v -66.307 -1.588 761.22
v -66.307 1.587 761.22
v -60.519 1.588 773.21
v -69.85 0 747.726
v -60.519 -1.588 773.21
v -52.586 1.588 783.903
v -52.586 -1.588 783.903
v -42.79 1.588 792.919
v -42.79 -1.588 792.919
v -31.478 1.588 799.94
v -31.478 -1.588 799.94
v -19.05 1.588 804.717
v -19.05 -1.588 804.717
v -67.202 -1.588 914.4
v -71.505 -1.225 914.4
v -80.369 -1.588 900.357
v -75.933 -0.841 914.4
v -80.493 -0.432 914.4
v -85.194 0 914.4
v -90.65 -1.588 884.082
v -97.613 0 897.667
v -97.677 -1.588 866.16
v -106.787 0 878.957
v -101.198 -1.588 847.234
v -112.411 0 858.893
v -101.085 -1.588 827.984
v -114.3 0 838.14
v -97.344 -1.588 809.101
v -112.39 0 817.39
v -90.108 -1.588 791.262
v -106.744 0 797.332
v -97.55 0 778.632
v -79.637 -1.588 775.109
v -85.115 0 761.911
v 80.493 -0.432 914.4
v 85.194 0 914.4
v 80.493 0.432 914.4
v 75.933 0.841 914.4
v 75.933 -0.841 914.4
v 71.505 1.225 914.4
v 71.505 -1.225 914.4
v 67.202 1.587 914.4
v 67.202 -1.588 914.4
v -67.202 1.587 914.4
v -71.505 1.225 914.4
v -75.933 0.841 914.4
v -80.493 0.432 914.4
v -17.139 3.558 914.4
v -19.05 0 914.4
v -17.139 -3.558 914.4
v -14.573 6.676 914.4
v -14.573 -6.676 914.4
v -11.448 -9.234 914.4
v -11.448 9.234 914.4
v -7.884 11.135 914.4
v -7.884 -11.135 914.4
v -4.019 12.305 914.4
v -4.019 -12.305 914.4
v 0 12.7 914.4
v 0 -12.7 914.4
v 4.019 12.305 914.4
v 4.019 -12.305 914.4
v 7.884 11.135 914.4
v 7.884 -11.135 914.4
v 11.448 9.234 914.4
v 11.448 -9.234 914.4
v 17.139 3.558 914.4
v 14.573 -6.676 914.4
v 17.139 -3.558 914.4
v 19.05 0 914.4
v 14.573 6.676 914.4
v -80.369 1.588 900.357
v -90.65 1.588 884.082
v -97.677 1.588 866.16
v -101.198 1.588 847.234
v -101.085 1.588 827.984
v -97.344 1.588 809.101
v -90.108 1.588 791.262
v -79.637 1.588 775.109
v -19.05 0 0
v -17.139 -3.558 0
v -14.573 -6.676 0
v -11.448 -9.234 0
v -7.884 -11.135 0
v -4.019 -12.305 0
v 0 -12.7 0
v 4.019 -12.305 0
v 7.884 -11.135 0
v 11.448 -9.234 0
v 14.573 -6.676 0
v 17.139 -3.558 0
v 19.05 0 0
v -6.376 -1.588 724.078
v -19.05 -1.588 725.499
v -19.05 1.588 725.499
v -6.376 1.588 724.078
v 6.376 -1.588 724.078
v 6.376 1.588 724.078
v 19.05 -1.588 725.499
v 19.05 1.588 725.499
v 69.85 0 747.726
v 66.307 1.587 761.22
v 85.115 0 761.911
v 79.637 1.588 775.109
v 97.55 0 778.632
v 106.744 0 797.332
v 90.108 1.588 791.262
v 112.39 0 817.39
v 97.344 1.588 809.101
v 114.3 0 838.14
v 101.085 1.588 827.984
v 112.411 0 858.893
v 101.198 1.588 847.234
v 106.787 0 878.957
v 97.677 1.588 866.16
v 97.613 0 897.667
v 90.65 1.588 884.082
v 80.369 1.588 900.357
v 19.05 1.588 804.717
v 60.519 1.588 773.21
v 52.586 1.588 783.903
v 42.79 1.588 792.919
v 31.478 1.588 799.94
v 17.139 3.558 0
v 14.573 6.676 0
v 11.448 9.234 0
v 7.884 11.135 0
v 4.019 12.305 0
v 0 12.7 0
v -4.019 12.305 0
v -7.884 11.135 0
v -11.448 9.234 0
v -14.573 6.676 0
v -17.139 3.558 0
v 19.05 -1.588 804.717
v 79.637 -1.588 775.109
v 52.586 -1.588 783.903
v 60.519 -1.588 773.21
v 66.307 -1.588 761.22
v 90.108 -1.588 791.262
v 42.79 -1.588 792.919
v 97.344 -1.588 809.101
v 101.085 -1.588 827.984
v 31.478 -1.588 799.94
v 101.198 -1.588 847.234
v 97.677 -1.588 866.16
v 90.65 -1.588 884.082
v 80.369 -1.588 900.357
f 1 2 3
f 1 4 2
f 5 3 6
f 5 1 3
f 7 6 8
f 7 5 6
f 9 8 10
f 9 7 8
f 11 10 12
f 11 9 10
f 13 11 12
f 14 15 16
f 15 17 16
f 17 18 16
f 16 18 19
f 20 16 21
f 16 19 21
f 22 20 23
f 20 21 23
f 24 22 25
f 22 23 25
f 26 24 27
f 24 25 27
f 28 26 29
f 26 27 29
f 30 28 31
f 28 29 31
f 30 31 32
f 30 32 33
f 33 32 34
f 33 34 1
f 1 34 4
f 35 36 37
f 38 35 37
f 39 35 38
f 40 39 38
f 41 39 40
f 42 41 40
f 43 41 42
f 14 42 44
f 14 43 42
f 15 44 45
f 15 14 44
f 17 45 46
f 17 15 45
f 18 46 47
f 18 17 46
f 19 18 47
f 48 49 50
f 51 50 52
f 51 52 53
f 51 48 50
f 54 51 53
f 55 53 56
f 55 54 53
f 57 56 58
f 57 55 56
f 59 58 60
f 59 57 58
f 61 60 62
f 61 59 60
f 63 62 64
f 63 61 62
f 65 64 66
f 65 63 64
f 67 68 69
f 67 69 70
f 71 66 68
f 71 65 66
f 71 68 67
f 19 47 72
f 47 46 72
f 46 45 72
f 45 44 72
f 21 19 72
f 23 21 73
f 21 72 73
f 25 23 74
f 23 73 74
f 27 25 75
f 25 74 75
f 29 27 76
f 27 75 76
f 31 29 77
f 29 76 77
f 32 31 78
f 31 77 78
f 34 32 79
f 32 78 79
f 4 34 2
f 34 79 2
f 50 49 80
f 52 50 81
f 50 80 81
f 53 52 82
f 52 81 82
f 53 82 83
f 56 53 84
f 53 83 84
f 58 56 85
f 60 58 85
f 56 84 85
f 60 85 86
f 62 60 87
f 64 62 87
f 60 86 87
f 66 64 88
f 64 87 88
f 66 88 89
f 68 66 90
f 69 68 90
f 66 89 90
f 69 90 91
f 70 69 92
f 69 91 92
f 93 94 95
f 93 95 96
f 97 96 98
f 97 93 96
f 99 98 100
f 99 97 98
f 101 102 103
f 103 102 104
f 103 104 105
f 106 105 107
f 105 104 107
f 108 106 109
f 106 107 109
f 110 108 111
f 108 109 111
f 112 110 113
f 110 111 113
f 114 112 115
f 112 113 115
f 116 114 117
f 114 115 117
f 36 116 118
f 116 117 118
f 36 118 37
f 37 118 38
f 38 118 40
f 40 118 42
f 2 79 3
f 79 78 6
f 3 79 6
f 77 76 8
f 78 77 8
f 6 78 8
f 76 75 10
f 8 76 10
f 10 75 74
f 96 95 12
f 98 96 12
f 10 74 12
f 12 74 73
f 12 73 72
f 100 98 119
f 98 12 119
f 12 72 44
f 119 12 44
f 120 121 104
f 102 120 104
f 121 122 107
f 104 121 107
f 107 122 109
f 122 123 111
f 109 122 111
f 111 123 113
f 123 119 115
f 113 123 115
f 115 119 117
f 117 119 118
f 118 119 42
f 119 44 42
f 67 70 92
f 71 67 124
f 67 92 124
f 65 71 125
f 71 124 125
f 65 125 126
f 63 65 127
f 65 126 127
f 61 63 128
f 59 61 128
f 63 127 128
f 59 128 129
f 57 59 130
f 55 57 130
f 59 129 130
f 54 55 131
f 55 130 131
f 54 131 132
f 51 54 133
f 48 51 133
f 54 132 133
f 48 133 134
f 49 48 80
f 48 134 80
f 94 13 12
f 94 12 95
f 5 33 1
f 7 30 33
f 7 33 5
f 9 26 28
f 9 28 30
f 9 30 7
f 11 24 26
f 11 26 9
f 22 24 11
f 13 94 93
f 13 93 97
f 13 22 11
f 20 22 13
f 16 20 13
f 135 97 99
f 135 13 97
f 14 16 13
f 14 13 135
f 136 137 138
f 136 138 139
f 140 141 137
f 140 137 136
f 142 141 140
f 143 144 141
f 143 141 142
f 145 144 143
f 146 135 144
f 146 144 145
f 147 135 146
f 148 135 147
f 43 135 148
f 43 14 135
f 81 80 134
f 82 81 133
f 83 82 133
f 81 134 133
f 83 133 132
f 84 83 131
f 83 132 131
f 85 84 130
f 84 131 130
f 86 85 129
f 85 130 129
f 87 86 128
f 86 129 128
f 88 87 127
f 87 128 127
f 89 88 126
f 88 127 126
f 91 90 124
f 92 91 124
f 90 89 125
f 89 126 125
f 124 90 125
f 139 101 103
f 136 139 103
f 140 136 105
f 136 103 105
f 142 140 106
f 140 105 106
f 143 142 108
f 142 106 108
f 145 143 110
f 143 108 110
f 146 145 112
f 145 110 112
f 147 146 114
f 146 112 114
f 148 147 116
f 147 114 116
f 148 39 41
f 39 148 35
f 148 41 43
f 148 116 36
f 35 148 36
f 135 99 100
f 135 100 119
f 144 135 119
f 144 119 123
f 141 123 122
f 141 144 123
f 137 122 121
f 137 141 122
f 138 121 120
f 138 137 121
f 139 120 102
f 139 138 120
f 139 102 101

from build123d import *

# Parameters (mm, degrees)
F1_DEPTH      = 914.4
F3_DEPTH      = 1.5875
F3_DEPTH_BACK = 1.5875
F4_SIZE2      = 1.5875
F4_SIZE       = 12.7
F5_SIZE2      = 12.69999
F5_SIZE       = 1.58749
F5_2_SIZE2    = 12.69999
F5_2_SIZE     = 1.58749


# Not quite as in the source:
# - a fillet or chamfer is up to 0.001 mm smaller than in the source, because OpenCascade refuses the exact size


with BuildPart() as f1:
    # F0 (on Top) → F1 (new body)
    with BuildSketch(Plane.XY):
        with BuildLine():
            ThreePointArc((-19.05, 0), (0, -12.7), (19.05, 0))
            ThreePointArc((19.05, 0), (0, 12.7), (-19.05, 0))
        make_face()
    extrude(amount=F1_DEPTH)


with BuildPart() as f3:
    # F2 (on Front) → F3 (new body, two sides)
    with BuildSketch(Plane.XZ) as f3_sk:
        with BuildLine():
            Line((85.1941899427, 914.4), (-85.1941899427, 914.4))
            ThreePointArc((-85.1941899427, 914.4), (-113.8186945704, 827.7217002194), (-69.85, 747.7264265103))
            ThreePointArc((-69.85, 747.7264265103), (-52.7994519478, 783.6641874561), (-19.05, 804.7169389131))
            Line((-19.05, 804.7169389131), (-19.05, 725.498680132))
            ThreePointArc((-19.05, 725.498680132), (0, 723.9), (19.05, 725.498680132))
            Line((19.05, 725.498680132), (19.05, 804.7169389131))
            ThreePointArc((19.05, 804.7169389131), (52.7994519478, 783.6641874561), (69.85, 747.7264265103))
            ThreePointArc((69.85, 747.7264265103), (113.8186945704, 827.7217002194), (85.1941899427, 914.4))
        make_face()
    extrude(amount=F3_DEPTH)
    extrude(f3_sk.sketch, amount=-F3_DEPTH_BACK)

    # F4
    f4_edges = [f3.edges().sort_by_distance(p)[0] for p in [
        (-113.818695, -1.5875, 827.7217),
        (113.818695, -1.5875, 827.7217),
    ]]
    f4_side = f3.faces().sort_by_distance((0, -1.5875, 838.185698))[0]
    chamfer(f4_edges, length=F4_SIZE, length2=F4_SIZE2, reference=f4_side)

    # F5 (size 1.5875 and 12.7 in the source; OpenCascade refuses exactly that, so slightly less here)
    f5_edges = [f3.edges().sort_by_distance(p)[0] for p in [
        (-113.818695, 1.5875, 827.7217),
    ]]
    f5_side = f3.faces().sort_by_distance((-113.818695, 0.79375, 827.7217))[0]
    chamfer(f5_edges, length=F5_SIZE, length2=F5_SIZE2, reference=f5_side)

    # F5#2 (size 1.5875 and 12.7 in the source; OpenCascade refuses exactly that, so slightly less here)
    f5_2_edges = [f3.edges().sort_by_distance(p)[0] for p in [
        (113.818695, 1.5875, 827.7217),
    ]]
    f5_2_side = f3.faces().sort_by_distance((113.818695, 0.79375, 827.7217))[0]
    chamfer(f5_2_edges, length=F5_2_SIZE, length2=F5_2_SIZE2, reference=f5_2_side)


solid = Compound([f1.part, f3.part])
